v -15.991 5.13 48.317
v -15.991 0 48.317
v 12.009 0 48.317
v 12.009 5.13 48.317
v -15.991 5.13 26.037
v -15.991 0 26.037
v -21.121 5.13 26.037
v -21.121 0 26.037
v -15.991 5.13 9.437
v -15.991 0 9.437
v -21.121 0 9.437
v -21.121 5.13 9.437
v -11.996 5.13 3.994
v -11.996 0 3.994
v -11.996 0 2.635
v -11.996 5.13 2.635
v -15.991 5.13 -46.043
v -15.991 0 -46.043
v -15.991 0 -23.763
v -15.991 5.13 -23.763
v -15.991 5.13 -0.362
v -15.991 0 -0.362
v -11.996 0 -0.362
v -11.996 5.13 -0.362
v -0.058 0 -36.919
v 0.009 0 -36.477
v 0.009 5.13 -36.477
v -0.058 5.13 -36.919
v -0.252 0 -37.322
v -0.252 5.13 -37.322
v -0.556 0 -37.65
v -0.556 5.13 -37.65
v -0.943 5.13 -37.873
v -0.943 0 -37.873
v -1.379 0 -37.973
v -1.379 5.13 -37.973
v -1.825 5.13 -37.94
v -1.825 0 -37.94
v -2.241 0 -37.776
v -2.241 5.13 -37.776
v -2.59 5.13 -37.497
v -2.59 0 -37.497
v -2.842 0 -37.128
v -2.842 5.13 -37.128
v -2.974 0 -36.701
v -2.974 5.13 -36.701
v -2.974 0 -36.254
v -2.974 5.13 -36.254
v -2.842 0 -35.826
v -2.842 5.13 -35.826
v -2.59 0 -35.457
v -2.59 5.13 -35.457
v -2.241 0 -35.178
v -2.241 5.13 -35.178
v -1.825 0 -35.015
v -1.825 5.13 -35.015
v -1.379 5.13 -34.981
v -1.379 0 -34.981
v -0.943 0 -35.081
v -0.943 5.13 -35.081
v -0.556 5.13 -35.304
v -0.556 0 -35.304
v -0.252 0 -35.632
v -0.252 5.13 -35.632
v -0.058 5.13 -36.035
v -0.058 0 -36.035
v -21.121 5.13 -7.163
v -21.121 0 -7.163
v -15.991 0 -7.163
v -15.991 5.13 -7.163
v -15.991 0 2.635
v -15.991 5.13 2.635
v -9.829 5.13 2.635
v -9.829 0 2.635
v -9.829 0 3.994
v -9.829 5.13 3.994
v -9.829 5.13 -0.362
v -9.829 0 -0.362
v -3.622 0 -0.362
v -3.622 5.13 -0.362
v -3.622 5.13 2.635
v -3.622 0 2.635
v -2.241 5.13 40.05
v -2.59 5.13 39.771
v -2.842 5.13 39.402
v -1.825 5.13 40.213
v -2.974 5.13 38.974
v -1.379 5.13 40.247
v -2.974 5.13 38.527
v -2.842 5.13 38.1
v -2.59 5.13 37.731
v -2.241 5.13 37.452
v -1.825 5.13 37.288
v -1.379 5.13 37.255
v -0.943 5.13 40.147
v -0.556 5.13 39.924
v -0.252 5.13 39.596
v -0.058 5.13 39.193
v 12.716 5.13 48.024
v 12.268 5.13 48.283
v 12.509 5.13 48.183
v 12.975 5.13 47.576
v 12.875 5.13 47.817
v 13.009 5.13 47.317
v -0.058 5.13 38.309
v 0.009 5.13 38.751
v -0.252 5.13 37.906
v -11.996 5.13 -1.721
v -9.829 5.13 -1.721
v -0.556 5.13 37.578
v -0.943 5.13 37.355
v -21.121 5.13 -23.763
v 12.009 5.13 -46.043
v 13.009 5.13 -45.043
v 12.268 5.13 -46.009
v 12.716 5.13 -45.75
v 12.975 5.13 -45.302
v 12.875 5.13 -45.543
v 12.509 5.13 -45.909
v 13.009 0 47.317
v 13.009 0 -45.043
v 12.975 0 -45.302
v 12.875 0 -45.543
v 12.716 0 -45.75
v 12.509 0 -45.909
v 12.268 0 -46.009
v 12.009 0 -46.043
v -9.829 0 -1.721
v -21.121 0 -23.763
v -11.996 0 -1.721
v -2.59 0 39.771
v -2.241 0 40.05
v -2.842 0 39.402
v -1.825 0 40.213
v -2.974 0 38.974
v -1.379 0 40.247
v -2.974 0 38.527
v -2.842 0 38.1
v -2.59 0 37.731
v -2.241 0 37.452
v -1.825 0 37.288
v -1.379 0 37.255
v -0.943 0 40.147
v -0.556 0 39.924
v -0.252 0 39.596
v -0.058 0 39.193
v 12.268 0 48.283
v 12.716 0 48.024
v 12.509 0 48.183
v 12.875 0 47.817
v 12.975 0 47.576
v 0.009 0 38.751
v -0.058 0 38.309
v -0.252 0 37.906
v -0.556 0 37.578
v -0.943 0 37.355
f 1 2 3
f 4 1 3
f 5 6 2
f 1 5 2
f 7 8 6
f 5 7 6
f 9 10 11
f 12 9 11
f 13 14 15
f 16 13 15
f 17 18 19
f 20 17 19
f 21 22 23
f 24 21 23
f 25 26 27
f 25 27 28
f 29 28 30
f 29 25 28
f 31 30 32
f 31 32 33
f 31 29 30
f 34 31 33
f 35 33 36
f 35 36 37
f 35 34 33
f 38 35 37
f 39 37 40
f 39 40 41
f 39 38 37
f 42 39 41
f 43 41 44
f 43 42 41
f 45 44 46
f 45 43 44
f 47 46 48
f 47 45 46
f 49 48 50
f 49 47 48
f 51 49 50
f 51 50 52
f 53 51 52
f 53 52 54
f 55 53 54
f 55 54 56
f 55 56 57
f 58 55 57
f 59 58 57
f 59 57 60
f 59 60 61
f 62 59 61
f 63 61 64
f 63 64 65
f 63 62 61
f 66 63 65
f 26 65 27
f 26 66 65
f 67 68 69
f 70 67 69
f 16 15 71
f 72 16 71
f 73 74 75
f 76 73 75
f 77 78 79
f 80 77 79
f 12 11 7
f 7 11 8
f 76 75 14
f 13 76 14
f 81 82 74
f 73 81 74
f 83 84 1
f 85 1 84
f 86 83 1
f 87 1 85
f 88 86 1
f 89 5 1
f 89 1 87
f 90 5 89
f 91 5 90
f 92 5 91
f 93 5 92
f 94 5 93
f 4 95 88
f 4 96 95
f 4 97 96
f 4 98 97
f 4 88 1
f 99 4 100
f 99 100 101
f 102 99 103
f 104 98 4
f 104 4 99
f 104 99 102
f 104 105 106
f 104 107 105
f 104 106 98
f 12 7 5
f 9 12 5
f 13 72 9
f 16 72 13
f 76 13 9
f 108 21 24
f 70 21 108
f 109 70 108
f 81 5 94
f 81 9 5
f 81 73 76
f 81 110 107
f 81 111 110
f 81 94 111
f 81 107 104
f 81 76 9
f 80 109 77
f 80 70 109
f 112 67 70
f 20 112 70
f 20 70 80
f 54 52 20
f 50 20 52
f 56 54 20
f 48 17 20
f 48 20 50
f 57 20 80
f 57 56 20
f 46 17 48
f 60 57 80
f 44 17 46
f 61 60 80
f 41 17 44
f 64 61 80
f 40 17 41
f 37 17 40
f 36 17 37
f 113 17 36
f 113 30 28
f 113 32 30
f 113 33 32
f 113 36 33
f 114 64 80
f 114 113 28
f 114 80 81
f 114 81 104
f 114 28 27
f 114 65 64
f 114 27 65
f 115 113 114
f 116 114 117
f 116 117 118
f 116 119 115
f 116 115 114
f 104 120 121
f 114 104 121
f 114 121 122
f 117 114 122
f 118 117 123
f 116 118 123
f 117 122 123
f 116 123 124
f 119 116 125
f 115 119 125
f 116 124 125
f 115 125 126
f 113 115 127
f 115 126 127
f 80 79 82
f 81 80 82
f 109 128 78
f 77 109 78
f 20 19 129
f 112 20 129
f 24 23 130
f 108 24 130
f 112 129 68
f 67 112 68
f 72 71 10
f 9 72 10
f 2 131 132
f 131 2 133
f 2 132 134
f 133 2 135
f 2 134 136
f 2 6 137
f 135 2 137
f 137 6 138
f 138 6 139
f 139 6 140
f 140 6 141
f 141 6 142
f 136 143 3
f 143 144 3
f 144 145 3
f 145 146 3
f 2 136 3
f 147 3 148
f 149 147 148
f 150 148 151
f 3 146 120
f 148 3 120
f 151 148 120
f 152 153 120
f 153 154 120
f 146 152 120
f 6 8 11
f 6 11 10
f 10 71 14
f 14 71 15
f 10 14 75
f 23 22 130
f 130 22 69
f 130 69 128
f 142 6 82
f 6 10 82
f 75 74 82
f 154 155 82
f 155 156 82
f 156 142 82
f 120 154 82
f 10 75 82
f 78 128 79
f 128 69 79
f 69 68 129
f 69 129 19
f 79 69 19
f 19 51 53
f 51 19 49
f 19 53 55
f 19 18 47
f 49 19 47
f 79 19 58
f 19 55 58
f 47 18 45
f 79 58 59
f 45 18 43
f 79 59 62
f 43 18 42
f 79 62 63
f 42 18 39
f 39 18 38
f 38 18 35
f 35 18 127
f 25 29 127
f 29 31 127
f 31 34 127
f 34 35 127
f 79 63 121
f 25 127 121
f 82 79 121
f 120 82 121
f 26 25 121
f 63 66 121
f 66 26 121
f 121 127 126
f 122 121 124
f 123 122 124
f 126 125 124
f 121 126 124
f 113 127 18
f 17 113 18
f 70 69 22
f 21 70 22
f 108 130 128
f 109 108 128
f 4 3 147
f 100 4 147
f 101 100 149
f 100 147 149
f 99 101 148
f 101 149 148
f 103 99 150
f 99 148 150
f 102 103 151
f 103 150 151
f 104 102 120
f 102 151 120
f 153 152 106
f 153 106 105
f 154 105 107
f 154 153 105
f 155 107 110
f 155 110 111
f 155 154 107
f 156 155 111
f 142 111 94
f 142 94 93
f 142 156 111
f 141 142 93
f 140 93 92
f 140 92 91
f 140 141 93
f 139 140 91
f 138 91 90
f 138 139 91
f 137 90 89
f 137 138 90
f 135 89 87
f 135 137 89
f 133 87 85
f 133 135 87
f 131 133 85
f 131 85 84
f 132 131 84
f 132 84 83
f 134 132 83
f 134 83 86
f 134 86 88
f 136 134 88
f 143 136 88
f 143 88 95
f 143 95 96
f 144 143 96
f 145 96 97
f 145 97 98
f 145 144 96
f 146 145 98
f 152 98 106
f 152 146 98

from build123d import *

# Parameters (mm, degrees)
SKETCH3_R           = 1.5
BOSS_EXTRUDE1_DEPTH = 5.13


with BuildPart() as part:
    # Sketch3 → Boss-Extrude1 (new body)
    with BuildSketch(Plane(origin=(0, 0, 0), x_dir=(1, 0, 0), z_dir=(0, 1, 0))):
        with BuildLine():
            Line((-15.990914087, -2.635364826), (-15.990914087, -9.436864826))
            Line((-15.990914087, -9.436864826), (-21.120914087, -9.436864826))
            Line((-21.120914087, -9.436864826), (-21.120914087, -26.036864826))
            Line((-21.120914087, -26.036864826), (-15.990914087, -26.036864826))
            Line((-15.990914087, -26.036864826), (-15.990914087, -48.316864826))
            Line((-15.990914087, -48.316864826), (12.009085913, -48.316864826))
            ThreePointArc((12.009085913, -48.316864826), (12.716192694, -48.023971608), (13.009085913, -47.316864826))
            Line((13.009085913, -47.316864826), (13.009085913, 45.043135174))
            ThreePointArc((13.009085913, 45.043135174), (12.716192694, 45.750241955), (12.009085913, 46.043135174))
            Line((12.009085913, 46.043135174), (-15.990914087, 46.043135174))
            Line((-15.990914087, 46.043135174), (-15.990914087, 23.763135174))
            Line((-15.990914087, 23.763135174), (-21.120914087, 23.763135174))
            Line((-21.120914087, 23.763135174), (-21.120914087, 7.163135174))
            Line((-21.120914087, 7.163135174), (-15.990914087, 7.163135174))
            Line((-15.990914087, 7.163135174), (-15.990914087, 0.361635174))
            Line((-15.990914087, 0.361635174), (-11.995914087, 0.361635174))
            Line((-11.995914087, 0.361635174), (-11.995914087, 1.720635174))
            Line((-11.995914087, 1.720635174), (-9.828914087, 1.720635174))
            Line((-9.828914087, 1.720635174), (-9.828914087, 0.361635174))
            Line((-9.828914087, 0.361635174), (-3.621914087, 0.361635174))
            Line((-3.621914087, 0.361635174), (-3.621914087, -2.635364826))
            Line((-3.621914087, -2.635364826), (-9.828914087, -2.635364826))
            Line((-9.828914087, -2.635364826), (-9.828914087, -3.994364826))
            Line((-9.828914087, -3.994364826), (-11.995914087, -3.994364826))
            Line((-11.995914087, -3.994364826), (-11.995914087, -2.635364826))
            Line((-11.995914087, -2.635364826), (-15.990914087, -2.635364826))
        make_face()
        with Locations((-1.490914087, -38.750864826)):
            Circle(SKETCH3_R, mode=Mode.SUBTRACT)
        with Locations((-1.490914087, 36.477135174)):
            Circle(SKETCH3_R, mode=Mode.SUBTRACT)
    extrude(amount=BOSS_EXTRUDE1_DEPTH)


solid = part.part
